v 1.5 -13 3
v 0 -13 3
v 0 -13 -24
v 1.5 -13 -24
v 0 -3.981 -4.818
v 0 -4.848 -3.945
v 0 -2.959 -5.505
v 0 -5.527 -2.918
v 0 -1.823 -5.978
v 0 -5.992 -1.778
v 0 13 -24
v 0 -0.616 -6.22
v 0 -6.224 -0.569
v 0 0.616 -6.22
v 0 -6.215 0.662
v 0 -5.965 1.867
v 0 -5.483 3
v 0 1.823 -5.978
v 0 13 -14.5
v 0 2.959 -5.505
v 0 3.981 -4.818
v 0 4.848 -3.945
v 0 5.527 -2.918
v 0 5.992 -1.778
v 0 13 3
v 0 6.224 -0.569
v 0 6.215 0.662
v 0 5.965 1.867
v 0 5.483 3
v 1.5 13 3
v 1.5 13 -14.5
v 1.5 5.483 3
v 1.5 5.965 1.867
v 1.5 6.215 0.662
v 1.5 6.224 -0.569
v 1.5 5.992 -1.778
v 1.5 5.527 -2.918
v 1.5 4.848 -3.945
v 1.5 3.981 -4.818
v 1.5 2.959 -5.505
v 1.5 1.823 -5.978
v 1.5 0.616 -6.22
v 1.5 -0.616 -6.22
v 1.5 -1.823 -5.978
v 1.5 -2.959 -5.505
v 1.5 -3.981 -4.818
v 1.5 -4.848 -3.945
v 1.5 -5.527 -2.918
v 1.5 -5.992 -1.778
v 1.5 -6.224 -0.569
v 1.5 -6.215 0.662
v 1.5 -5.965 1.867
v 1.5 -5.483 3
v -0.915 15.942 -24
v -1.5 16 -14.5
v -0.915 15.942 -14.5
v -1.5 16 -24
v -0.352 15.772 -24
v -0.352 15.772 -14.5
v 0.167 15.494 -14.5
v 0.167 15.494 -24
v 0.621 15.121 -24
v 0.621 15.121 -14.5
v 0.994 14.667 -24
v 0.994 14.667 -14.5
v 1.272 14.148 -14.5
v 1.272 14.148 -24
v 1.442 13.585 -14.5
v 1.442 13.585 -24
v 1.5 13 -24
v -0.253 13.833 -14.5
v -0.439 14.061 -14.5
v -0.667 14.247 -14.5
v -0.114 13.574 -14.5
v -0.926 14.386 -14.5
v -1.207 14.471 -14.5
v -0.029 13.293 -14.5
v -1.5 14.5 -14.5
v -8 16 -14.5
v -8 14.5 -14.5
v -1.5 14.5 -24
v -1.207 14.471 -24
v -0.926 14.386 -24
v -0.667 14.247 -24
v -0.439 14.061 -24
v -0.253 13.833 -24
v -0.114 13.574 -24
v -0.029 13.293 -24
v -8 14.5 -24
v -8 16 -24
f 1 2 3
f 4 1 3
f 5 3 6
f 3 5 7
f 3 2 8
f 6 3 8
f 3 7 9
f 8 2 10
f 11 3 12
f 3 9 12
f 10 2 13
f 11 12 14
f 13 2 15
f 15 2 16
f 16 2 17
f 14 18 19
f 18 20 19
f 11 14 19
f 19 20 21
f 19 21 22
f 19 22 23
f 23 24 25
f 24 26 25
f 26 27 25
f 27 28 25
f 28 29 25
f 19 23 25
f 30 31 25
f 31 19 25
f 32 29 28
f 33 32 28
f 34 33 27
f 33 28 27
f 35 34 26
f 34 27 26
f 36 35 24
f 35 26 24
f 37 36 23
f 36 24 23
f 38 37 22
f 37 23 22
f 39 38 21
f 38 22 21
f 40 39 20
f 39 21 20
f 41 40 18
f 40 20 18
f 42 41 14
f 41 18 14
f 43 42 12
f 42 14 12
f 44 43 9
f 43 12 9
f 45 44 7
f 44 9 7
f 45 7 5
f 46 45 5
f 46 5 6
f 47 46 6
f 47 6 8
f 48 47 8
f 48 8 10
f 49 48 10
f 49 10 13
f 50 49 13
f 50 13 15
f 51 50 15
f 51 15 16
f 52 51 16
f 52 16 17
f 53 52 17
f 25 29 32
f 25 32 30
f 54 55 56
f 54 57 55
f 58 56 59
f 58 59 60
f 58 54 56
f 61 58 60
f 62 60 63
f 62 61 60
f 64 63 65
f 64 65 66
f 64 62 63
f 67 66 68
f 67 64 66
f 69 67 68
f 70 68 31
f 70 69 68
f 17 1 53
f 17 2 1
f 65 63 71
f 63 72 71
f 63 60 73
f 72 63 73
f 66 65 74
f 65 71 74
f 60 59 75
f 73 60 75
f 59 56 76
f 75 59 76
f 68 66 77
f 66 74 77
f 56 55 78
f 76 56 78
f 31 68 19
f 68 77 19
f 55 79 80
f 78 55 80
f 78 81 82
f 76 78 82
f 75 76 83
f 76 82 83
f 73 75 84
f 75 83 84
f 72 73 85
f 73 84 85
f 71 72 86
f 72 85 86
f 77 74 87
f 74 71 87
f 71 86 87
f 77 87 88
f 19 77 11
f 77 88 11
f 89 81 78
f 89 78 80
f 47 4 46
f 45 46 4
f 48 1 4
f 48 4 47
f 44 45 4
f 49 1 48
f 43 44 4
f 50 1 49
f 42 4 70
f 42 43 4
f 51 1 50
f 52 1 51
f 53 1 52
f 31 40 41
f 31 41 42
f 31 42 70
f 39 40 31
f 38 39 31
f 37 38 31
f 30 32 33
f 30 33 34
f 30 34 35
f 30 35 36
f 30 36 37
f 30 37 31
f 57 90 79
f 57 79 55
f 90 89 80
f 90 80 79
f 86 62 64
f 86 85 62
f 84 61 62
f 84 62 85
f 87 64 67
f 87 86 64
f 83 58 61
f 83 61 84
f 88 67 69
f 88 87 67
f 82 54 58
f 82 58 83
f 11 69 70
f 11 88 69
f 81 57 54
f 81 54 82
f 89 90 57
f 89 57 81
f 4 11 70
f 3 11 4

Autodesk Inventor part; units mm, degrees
ref_plane "YZ Plane" through (0, 0, 0) normal (1, 0, 0) x (0, 1, 0)
ref_plane "XZ Plane" through (0, 0, 0) normal (0, 1, 0) x (-1, 0, 0)
ref_plane "XY Plane" through (0, 0, 0) normal (0, 0, 1) x (1, 0, 0)
sketch "スケッチ2" plane through (0, 0, 0) normal (1, 0, 0) x (0, 1, 0)
  circle A0 centre (0, 0) radius 6.25
  line L0 (13, 0) -> (-13, 0) construction
  line L1 (-13, 0) -> (-13, -24)
  line L2 (-13, -24) -> (13, -24)
  line L3 (13, -24) -> (13, 0)
  line L4 (13, -24) -> (16, -24)
  line L5 (16, -24) -> (16, -14.5)
  line L6 (16, -14.5) -> (13, -14.5)
  line L7 (13, -14.5) -> (13, -24)
  line L8 (13, 0) -> (-13, 0)
  line L9 (-13, 0) -> (-13, 3)
  line L10 (-13, 3) -> (13, 3)
  line L11 (13, 3) -> (13, 0)
  point P0 (13, 0)
  point P1 (5.4829, 3)
  point P2 (-5.4829, 3)
  point P3 (-13, 0)
  dimension "d0" = 12.5
  dimension "d1" = 26
  dimension "d2" = 24
  dimension "d3" = 3
  dimension "d4" = 9.5
  dimension "d5" = 3
extrude "プレート1" add sketch "スケッチ2" along normal blind 1.5 contours L8 L3 L2 L1 A0 | A0 L10 L11 L8 | L8 L9 L10 A0 | L6 L5 L4 L3
sketch "スケッチ3" plane through (1.5, 14.5, -24) normal (0, 1, 0) x (-1, 0, 0)
  line L0 (0, 9.5) -> (0, 0)
  line L1 (0, 0) -> (9.5, 0)
  line L2 (9.5, 0) -> (9.5, 9.5)
  line L3 (9.5, 9.5) -> (0, 9.5)
edge flange "フランジ1" height 9.5 angle 90 thickness 1.5 bend radius 1.5 thickness toward (0, 1, 0) relief tear relief width 1.5 relief depth 0.75 edges at (0, 16, -19.25) wall of the first edge with corners at (1.5, 14.5, -14.5) (1.5, 14.5, -24) (-8, 14.5, -24) (-8, 14.5, -14.5)
bend "曲げ1"
corner "コーナー1"
equation "\"d6\" = Thickness"
equation "\"d7\" = BendReliefWidth"
equation "\"d8\" = BendReliefDepth"
equation "\"d9\" = MinimumRemnant"
equation "\"d10\" = TransitionRadius"
equation "\"d13\" = BendRadius"
equation "\"d14\" = CornerReliefSize"
equation "\"d15\" = GapSize"
equation "\"d16\" = JacobiRadiusSize"
equation "\"BendRadius\" = Thickness"
equation "\"BendReliefWidth\" = Thickness"
equation "\"BendReliefDepth\" = 0.5 * Thickness"
equation "\"CornerReliefSize\" = 4 * Thickness"
equation "\"MinimumRemnant\" = 2 * Thickness"
equation "\"TransitionRadius\" = BendRadius"
equation "\"JacobiRadiusSize\" = BendRadius"
equation "\"GapSize\" = Thickness"
equation "\"Thickness\" = 1.5"
properties part number "hipjoint_toleg_under_down_right"
